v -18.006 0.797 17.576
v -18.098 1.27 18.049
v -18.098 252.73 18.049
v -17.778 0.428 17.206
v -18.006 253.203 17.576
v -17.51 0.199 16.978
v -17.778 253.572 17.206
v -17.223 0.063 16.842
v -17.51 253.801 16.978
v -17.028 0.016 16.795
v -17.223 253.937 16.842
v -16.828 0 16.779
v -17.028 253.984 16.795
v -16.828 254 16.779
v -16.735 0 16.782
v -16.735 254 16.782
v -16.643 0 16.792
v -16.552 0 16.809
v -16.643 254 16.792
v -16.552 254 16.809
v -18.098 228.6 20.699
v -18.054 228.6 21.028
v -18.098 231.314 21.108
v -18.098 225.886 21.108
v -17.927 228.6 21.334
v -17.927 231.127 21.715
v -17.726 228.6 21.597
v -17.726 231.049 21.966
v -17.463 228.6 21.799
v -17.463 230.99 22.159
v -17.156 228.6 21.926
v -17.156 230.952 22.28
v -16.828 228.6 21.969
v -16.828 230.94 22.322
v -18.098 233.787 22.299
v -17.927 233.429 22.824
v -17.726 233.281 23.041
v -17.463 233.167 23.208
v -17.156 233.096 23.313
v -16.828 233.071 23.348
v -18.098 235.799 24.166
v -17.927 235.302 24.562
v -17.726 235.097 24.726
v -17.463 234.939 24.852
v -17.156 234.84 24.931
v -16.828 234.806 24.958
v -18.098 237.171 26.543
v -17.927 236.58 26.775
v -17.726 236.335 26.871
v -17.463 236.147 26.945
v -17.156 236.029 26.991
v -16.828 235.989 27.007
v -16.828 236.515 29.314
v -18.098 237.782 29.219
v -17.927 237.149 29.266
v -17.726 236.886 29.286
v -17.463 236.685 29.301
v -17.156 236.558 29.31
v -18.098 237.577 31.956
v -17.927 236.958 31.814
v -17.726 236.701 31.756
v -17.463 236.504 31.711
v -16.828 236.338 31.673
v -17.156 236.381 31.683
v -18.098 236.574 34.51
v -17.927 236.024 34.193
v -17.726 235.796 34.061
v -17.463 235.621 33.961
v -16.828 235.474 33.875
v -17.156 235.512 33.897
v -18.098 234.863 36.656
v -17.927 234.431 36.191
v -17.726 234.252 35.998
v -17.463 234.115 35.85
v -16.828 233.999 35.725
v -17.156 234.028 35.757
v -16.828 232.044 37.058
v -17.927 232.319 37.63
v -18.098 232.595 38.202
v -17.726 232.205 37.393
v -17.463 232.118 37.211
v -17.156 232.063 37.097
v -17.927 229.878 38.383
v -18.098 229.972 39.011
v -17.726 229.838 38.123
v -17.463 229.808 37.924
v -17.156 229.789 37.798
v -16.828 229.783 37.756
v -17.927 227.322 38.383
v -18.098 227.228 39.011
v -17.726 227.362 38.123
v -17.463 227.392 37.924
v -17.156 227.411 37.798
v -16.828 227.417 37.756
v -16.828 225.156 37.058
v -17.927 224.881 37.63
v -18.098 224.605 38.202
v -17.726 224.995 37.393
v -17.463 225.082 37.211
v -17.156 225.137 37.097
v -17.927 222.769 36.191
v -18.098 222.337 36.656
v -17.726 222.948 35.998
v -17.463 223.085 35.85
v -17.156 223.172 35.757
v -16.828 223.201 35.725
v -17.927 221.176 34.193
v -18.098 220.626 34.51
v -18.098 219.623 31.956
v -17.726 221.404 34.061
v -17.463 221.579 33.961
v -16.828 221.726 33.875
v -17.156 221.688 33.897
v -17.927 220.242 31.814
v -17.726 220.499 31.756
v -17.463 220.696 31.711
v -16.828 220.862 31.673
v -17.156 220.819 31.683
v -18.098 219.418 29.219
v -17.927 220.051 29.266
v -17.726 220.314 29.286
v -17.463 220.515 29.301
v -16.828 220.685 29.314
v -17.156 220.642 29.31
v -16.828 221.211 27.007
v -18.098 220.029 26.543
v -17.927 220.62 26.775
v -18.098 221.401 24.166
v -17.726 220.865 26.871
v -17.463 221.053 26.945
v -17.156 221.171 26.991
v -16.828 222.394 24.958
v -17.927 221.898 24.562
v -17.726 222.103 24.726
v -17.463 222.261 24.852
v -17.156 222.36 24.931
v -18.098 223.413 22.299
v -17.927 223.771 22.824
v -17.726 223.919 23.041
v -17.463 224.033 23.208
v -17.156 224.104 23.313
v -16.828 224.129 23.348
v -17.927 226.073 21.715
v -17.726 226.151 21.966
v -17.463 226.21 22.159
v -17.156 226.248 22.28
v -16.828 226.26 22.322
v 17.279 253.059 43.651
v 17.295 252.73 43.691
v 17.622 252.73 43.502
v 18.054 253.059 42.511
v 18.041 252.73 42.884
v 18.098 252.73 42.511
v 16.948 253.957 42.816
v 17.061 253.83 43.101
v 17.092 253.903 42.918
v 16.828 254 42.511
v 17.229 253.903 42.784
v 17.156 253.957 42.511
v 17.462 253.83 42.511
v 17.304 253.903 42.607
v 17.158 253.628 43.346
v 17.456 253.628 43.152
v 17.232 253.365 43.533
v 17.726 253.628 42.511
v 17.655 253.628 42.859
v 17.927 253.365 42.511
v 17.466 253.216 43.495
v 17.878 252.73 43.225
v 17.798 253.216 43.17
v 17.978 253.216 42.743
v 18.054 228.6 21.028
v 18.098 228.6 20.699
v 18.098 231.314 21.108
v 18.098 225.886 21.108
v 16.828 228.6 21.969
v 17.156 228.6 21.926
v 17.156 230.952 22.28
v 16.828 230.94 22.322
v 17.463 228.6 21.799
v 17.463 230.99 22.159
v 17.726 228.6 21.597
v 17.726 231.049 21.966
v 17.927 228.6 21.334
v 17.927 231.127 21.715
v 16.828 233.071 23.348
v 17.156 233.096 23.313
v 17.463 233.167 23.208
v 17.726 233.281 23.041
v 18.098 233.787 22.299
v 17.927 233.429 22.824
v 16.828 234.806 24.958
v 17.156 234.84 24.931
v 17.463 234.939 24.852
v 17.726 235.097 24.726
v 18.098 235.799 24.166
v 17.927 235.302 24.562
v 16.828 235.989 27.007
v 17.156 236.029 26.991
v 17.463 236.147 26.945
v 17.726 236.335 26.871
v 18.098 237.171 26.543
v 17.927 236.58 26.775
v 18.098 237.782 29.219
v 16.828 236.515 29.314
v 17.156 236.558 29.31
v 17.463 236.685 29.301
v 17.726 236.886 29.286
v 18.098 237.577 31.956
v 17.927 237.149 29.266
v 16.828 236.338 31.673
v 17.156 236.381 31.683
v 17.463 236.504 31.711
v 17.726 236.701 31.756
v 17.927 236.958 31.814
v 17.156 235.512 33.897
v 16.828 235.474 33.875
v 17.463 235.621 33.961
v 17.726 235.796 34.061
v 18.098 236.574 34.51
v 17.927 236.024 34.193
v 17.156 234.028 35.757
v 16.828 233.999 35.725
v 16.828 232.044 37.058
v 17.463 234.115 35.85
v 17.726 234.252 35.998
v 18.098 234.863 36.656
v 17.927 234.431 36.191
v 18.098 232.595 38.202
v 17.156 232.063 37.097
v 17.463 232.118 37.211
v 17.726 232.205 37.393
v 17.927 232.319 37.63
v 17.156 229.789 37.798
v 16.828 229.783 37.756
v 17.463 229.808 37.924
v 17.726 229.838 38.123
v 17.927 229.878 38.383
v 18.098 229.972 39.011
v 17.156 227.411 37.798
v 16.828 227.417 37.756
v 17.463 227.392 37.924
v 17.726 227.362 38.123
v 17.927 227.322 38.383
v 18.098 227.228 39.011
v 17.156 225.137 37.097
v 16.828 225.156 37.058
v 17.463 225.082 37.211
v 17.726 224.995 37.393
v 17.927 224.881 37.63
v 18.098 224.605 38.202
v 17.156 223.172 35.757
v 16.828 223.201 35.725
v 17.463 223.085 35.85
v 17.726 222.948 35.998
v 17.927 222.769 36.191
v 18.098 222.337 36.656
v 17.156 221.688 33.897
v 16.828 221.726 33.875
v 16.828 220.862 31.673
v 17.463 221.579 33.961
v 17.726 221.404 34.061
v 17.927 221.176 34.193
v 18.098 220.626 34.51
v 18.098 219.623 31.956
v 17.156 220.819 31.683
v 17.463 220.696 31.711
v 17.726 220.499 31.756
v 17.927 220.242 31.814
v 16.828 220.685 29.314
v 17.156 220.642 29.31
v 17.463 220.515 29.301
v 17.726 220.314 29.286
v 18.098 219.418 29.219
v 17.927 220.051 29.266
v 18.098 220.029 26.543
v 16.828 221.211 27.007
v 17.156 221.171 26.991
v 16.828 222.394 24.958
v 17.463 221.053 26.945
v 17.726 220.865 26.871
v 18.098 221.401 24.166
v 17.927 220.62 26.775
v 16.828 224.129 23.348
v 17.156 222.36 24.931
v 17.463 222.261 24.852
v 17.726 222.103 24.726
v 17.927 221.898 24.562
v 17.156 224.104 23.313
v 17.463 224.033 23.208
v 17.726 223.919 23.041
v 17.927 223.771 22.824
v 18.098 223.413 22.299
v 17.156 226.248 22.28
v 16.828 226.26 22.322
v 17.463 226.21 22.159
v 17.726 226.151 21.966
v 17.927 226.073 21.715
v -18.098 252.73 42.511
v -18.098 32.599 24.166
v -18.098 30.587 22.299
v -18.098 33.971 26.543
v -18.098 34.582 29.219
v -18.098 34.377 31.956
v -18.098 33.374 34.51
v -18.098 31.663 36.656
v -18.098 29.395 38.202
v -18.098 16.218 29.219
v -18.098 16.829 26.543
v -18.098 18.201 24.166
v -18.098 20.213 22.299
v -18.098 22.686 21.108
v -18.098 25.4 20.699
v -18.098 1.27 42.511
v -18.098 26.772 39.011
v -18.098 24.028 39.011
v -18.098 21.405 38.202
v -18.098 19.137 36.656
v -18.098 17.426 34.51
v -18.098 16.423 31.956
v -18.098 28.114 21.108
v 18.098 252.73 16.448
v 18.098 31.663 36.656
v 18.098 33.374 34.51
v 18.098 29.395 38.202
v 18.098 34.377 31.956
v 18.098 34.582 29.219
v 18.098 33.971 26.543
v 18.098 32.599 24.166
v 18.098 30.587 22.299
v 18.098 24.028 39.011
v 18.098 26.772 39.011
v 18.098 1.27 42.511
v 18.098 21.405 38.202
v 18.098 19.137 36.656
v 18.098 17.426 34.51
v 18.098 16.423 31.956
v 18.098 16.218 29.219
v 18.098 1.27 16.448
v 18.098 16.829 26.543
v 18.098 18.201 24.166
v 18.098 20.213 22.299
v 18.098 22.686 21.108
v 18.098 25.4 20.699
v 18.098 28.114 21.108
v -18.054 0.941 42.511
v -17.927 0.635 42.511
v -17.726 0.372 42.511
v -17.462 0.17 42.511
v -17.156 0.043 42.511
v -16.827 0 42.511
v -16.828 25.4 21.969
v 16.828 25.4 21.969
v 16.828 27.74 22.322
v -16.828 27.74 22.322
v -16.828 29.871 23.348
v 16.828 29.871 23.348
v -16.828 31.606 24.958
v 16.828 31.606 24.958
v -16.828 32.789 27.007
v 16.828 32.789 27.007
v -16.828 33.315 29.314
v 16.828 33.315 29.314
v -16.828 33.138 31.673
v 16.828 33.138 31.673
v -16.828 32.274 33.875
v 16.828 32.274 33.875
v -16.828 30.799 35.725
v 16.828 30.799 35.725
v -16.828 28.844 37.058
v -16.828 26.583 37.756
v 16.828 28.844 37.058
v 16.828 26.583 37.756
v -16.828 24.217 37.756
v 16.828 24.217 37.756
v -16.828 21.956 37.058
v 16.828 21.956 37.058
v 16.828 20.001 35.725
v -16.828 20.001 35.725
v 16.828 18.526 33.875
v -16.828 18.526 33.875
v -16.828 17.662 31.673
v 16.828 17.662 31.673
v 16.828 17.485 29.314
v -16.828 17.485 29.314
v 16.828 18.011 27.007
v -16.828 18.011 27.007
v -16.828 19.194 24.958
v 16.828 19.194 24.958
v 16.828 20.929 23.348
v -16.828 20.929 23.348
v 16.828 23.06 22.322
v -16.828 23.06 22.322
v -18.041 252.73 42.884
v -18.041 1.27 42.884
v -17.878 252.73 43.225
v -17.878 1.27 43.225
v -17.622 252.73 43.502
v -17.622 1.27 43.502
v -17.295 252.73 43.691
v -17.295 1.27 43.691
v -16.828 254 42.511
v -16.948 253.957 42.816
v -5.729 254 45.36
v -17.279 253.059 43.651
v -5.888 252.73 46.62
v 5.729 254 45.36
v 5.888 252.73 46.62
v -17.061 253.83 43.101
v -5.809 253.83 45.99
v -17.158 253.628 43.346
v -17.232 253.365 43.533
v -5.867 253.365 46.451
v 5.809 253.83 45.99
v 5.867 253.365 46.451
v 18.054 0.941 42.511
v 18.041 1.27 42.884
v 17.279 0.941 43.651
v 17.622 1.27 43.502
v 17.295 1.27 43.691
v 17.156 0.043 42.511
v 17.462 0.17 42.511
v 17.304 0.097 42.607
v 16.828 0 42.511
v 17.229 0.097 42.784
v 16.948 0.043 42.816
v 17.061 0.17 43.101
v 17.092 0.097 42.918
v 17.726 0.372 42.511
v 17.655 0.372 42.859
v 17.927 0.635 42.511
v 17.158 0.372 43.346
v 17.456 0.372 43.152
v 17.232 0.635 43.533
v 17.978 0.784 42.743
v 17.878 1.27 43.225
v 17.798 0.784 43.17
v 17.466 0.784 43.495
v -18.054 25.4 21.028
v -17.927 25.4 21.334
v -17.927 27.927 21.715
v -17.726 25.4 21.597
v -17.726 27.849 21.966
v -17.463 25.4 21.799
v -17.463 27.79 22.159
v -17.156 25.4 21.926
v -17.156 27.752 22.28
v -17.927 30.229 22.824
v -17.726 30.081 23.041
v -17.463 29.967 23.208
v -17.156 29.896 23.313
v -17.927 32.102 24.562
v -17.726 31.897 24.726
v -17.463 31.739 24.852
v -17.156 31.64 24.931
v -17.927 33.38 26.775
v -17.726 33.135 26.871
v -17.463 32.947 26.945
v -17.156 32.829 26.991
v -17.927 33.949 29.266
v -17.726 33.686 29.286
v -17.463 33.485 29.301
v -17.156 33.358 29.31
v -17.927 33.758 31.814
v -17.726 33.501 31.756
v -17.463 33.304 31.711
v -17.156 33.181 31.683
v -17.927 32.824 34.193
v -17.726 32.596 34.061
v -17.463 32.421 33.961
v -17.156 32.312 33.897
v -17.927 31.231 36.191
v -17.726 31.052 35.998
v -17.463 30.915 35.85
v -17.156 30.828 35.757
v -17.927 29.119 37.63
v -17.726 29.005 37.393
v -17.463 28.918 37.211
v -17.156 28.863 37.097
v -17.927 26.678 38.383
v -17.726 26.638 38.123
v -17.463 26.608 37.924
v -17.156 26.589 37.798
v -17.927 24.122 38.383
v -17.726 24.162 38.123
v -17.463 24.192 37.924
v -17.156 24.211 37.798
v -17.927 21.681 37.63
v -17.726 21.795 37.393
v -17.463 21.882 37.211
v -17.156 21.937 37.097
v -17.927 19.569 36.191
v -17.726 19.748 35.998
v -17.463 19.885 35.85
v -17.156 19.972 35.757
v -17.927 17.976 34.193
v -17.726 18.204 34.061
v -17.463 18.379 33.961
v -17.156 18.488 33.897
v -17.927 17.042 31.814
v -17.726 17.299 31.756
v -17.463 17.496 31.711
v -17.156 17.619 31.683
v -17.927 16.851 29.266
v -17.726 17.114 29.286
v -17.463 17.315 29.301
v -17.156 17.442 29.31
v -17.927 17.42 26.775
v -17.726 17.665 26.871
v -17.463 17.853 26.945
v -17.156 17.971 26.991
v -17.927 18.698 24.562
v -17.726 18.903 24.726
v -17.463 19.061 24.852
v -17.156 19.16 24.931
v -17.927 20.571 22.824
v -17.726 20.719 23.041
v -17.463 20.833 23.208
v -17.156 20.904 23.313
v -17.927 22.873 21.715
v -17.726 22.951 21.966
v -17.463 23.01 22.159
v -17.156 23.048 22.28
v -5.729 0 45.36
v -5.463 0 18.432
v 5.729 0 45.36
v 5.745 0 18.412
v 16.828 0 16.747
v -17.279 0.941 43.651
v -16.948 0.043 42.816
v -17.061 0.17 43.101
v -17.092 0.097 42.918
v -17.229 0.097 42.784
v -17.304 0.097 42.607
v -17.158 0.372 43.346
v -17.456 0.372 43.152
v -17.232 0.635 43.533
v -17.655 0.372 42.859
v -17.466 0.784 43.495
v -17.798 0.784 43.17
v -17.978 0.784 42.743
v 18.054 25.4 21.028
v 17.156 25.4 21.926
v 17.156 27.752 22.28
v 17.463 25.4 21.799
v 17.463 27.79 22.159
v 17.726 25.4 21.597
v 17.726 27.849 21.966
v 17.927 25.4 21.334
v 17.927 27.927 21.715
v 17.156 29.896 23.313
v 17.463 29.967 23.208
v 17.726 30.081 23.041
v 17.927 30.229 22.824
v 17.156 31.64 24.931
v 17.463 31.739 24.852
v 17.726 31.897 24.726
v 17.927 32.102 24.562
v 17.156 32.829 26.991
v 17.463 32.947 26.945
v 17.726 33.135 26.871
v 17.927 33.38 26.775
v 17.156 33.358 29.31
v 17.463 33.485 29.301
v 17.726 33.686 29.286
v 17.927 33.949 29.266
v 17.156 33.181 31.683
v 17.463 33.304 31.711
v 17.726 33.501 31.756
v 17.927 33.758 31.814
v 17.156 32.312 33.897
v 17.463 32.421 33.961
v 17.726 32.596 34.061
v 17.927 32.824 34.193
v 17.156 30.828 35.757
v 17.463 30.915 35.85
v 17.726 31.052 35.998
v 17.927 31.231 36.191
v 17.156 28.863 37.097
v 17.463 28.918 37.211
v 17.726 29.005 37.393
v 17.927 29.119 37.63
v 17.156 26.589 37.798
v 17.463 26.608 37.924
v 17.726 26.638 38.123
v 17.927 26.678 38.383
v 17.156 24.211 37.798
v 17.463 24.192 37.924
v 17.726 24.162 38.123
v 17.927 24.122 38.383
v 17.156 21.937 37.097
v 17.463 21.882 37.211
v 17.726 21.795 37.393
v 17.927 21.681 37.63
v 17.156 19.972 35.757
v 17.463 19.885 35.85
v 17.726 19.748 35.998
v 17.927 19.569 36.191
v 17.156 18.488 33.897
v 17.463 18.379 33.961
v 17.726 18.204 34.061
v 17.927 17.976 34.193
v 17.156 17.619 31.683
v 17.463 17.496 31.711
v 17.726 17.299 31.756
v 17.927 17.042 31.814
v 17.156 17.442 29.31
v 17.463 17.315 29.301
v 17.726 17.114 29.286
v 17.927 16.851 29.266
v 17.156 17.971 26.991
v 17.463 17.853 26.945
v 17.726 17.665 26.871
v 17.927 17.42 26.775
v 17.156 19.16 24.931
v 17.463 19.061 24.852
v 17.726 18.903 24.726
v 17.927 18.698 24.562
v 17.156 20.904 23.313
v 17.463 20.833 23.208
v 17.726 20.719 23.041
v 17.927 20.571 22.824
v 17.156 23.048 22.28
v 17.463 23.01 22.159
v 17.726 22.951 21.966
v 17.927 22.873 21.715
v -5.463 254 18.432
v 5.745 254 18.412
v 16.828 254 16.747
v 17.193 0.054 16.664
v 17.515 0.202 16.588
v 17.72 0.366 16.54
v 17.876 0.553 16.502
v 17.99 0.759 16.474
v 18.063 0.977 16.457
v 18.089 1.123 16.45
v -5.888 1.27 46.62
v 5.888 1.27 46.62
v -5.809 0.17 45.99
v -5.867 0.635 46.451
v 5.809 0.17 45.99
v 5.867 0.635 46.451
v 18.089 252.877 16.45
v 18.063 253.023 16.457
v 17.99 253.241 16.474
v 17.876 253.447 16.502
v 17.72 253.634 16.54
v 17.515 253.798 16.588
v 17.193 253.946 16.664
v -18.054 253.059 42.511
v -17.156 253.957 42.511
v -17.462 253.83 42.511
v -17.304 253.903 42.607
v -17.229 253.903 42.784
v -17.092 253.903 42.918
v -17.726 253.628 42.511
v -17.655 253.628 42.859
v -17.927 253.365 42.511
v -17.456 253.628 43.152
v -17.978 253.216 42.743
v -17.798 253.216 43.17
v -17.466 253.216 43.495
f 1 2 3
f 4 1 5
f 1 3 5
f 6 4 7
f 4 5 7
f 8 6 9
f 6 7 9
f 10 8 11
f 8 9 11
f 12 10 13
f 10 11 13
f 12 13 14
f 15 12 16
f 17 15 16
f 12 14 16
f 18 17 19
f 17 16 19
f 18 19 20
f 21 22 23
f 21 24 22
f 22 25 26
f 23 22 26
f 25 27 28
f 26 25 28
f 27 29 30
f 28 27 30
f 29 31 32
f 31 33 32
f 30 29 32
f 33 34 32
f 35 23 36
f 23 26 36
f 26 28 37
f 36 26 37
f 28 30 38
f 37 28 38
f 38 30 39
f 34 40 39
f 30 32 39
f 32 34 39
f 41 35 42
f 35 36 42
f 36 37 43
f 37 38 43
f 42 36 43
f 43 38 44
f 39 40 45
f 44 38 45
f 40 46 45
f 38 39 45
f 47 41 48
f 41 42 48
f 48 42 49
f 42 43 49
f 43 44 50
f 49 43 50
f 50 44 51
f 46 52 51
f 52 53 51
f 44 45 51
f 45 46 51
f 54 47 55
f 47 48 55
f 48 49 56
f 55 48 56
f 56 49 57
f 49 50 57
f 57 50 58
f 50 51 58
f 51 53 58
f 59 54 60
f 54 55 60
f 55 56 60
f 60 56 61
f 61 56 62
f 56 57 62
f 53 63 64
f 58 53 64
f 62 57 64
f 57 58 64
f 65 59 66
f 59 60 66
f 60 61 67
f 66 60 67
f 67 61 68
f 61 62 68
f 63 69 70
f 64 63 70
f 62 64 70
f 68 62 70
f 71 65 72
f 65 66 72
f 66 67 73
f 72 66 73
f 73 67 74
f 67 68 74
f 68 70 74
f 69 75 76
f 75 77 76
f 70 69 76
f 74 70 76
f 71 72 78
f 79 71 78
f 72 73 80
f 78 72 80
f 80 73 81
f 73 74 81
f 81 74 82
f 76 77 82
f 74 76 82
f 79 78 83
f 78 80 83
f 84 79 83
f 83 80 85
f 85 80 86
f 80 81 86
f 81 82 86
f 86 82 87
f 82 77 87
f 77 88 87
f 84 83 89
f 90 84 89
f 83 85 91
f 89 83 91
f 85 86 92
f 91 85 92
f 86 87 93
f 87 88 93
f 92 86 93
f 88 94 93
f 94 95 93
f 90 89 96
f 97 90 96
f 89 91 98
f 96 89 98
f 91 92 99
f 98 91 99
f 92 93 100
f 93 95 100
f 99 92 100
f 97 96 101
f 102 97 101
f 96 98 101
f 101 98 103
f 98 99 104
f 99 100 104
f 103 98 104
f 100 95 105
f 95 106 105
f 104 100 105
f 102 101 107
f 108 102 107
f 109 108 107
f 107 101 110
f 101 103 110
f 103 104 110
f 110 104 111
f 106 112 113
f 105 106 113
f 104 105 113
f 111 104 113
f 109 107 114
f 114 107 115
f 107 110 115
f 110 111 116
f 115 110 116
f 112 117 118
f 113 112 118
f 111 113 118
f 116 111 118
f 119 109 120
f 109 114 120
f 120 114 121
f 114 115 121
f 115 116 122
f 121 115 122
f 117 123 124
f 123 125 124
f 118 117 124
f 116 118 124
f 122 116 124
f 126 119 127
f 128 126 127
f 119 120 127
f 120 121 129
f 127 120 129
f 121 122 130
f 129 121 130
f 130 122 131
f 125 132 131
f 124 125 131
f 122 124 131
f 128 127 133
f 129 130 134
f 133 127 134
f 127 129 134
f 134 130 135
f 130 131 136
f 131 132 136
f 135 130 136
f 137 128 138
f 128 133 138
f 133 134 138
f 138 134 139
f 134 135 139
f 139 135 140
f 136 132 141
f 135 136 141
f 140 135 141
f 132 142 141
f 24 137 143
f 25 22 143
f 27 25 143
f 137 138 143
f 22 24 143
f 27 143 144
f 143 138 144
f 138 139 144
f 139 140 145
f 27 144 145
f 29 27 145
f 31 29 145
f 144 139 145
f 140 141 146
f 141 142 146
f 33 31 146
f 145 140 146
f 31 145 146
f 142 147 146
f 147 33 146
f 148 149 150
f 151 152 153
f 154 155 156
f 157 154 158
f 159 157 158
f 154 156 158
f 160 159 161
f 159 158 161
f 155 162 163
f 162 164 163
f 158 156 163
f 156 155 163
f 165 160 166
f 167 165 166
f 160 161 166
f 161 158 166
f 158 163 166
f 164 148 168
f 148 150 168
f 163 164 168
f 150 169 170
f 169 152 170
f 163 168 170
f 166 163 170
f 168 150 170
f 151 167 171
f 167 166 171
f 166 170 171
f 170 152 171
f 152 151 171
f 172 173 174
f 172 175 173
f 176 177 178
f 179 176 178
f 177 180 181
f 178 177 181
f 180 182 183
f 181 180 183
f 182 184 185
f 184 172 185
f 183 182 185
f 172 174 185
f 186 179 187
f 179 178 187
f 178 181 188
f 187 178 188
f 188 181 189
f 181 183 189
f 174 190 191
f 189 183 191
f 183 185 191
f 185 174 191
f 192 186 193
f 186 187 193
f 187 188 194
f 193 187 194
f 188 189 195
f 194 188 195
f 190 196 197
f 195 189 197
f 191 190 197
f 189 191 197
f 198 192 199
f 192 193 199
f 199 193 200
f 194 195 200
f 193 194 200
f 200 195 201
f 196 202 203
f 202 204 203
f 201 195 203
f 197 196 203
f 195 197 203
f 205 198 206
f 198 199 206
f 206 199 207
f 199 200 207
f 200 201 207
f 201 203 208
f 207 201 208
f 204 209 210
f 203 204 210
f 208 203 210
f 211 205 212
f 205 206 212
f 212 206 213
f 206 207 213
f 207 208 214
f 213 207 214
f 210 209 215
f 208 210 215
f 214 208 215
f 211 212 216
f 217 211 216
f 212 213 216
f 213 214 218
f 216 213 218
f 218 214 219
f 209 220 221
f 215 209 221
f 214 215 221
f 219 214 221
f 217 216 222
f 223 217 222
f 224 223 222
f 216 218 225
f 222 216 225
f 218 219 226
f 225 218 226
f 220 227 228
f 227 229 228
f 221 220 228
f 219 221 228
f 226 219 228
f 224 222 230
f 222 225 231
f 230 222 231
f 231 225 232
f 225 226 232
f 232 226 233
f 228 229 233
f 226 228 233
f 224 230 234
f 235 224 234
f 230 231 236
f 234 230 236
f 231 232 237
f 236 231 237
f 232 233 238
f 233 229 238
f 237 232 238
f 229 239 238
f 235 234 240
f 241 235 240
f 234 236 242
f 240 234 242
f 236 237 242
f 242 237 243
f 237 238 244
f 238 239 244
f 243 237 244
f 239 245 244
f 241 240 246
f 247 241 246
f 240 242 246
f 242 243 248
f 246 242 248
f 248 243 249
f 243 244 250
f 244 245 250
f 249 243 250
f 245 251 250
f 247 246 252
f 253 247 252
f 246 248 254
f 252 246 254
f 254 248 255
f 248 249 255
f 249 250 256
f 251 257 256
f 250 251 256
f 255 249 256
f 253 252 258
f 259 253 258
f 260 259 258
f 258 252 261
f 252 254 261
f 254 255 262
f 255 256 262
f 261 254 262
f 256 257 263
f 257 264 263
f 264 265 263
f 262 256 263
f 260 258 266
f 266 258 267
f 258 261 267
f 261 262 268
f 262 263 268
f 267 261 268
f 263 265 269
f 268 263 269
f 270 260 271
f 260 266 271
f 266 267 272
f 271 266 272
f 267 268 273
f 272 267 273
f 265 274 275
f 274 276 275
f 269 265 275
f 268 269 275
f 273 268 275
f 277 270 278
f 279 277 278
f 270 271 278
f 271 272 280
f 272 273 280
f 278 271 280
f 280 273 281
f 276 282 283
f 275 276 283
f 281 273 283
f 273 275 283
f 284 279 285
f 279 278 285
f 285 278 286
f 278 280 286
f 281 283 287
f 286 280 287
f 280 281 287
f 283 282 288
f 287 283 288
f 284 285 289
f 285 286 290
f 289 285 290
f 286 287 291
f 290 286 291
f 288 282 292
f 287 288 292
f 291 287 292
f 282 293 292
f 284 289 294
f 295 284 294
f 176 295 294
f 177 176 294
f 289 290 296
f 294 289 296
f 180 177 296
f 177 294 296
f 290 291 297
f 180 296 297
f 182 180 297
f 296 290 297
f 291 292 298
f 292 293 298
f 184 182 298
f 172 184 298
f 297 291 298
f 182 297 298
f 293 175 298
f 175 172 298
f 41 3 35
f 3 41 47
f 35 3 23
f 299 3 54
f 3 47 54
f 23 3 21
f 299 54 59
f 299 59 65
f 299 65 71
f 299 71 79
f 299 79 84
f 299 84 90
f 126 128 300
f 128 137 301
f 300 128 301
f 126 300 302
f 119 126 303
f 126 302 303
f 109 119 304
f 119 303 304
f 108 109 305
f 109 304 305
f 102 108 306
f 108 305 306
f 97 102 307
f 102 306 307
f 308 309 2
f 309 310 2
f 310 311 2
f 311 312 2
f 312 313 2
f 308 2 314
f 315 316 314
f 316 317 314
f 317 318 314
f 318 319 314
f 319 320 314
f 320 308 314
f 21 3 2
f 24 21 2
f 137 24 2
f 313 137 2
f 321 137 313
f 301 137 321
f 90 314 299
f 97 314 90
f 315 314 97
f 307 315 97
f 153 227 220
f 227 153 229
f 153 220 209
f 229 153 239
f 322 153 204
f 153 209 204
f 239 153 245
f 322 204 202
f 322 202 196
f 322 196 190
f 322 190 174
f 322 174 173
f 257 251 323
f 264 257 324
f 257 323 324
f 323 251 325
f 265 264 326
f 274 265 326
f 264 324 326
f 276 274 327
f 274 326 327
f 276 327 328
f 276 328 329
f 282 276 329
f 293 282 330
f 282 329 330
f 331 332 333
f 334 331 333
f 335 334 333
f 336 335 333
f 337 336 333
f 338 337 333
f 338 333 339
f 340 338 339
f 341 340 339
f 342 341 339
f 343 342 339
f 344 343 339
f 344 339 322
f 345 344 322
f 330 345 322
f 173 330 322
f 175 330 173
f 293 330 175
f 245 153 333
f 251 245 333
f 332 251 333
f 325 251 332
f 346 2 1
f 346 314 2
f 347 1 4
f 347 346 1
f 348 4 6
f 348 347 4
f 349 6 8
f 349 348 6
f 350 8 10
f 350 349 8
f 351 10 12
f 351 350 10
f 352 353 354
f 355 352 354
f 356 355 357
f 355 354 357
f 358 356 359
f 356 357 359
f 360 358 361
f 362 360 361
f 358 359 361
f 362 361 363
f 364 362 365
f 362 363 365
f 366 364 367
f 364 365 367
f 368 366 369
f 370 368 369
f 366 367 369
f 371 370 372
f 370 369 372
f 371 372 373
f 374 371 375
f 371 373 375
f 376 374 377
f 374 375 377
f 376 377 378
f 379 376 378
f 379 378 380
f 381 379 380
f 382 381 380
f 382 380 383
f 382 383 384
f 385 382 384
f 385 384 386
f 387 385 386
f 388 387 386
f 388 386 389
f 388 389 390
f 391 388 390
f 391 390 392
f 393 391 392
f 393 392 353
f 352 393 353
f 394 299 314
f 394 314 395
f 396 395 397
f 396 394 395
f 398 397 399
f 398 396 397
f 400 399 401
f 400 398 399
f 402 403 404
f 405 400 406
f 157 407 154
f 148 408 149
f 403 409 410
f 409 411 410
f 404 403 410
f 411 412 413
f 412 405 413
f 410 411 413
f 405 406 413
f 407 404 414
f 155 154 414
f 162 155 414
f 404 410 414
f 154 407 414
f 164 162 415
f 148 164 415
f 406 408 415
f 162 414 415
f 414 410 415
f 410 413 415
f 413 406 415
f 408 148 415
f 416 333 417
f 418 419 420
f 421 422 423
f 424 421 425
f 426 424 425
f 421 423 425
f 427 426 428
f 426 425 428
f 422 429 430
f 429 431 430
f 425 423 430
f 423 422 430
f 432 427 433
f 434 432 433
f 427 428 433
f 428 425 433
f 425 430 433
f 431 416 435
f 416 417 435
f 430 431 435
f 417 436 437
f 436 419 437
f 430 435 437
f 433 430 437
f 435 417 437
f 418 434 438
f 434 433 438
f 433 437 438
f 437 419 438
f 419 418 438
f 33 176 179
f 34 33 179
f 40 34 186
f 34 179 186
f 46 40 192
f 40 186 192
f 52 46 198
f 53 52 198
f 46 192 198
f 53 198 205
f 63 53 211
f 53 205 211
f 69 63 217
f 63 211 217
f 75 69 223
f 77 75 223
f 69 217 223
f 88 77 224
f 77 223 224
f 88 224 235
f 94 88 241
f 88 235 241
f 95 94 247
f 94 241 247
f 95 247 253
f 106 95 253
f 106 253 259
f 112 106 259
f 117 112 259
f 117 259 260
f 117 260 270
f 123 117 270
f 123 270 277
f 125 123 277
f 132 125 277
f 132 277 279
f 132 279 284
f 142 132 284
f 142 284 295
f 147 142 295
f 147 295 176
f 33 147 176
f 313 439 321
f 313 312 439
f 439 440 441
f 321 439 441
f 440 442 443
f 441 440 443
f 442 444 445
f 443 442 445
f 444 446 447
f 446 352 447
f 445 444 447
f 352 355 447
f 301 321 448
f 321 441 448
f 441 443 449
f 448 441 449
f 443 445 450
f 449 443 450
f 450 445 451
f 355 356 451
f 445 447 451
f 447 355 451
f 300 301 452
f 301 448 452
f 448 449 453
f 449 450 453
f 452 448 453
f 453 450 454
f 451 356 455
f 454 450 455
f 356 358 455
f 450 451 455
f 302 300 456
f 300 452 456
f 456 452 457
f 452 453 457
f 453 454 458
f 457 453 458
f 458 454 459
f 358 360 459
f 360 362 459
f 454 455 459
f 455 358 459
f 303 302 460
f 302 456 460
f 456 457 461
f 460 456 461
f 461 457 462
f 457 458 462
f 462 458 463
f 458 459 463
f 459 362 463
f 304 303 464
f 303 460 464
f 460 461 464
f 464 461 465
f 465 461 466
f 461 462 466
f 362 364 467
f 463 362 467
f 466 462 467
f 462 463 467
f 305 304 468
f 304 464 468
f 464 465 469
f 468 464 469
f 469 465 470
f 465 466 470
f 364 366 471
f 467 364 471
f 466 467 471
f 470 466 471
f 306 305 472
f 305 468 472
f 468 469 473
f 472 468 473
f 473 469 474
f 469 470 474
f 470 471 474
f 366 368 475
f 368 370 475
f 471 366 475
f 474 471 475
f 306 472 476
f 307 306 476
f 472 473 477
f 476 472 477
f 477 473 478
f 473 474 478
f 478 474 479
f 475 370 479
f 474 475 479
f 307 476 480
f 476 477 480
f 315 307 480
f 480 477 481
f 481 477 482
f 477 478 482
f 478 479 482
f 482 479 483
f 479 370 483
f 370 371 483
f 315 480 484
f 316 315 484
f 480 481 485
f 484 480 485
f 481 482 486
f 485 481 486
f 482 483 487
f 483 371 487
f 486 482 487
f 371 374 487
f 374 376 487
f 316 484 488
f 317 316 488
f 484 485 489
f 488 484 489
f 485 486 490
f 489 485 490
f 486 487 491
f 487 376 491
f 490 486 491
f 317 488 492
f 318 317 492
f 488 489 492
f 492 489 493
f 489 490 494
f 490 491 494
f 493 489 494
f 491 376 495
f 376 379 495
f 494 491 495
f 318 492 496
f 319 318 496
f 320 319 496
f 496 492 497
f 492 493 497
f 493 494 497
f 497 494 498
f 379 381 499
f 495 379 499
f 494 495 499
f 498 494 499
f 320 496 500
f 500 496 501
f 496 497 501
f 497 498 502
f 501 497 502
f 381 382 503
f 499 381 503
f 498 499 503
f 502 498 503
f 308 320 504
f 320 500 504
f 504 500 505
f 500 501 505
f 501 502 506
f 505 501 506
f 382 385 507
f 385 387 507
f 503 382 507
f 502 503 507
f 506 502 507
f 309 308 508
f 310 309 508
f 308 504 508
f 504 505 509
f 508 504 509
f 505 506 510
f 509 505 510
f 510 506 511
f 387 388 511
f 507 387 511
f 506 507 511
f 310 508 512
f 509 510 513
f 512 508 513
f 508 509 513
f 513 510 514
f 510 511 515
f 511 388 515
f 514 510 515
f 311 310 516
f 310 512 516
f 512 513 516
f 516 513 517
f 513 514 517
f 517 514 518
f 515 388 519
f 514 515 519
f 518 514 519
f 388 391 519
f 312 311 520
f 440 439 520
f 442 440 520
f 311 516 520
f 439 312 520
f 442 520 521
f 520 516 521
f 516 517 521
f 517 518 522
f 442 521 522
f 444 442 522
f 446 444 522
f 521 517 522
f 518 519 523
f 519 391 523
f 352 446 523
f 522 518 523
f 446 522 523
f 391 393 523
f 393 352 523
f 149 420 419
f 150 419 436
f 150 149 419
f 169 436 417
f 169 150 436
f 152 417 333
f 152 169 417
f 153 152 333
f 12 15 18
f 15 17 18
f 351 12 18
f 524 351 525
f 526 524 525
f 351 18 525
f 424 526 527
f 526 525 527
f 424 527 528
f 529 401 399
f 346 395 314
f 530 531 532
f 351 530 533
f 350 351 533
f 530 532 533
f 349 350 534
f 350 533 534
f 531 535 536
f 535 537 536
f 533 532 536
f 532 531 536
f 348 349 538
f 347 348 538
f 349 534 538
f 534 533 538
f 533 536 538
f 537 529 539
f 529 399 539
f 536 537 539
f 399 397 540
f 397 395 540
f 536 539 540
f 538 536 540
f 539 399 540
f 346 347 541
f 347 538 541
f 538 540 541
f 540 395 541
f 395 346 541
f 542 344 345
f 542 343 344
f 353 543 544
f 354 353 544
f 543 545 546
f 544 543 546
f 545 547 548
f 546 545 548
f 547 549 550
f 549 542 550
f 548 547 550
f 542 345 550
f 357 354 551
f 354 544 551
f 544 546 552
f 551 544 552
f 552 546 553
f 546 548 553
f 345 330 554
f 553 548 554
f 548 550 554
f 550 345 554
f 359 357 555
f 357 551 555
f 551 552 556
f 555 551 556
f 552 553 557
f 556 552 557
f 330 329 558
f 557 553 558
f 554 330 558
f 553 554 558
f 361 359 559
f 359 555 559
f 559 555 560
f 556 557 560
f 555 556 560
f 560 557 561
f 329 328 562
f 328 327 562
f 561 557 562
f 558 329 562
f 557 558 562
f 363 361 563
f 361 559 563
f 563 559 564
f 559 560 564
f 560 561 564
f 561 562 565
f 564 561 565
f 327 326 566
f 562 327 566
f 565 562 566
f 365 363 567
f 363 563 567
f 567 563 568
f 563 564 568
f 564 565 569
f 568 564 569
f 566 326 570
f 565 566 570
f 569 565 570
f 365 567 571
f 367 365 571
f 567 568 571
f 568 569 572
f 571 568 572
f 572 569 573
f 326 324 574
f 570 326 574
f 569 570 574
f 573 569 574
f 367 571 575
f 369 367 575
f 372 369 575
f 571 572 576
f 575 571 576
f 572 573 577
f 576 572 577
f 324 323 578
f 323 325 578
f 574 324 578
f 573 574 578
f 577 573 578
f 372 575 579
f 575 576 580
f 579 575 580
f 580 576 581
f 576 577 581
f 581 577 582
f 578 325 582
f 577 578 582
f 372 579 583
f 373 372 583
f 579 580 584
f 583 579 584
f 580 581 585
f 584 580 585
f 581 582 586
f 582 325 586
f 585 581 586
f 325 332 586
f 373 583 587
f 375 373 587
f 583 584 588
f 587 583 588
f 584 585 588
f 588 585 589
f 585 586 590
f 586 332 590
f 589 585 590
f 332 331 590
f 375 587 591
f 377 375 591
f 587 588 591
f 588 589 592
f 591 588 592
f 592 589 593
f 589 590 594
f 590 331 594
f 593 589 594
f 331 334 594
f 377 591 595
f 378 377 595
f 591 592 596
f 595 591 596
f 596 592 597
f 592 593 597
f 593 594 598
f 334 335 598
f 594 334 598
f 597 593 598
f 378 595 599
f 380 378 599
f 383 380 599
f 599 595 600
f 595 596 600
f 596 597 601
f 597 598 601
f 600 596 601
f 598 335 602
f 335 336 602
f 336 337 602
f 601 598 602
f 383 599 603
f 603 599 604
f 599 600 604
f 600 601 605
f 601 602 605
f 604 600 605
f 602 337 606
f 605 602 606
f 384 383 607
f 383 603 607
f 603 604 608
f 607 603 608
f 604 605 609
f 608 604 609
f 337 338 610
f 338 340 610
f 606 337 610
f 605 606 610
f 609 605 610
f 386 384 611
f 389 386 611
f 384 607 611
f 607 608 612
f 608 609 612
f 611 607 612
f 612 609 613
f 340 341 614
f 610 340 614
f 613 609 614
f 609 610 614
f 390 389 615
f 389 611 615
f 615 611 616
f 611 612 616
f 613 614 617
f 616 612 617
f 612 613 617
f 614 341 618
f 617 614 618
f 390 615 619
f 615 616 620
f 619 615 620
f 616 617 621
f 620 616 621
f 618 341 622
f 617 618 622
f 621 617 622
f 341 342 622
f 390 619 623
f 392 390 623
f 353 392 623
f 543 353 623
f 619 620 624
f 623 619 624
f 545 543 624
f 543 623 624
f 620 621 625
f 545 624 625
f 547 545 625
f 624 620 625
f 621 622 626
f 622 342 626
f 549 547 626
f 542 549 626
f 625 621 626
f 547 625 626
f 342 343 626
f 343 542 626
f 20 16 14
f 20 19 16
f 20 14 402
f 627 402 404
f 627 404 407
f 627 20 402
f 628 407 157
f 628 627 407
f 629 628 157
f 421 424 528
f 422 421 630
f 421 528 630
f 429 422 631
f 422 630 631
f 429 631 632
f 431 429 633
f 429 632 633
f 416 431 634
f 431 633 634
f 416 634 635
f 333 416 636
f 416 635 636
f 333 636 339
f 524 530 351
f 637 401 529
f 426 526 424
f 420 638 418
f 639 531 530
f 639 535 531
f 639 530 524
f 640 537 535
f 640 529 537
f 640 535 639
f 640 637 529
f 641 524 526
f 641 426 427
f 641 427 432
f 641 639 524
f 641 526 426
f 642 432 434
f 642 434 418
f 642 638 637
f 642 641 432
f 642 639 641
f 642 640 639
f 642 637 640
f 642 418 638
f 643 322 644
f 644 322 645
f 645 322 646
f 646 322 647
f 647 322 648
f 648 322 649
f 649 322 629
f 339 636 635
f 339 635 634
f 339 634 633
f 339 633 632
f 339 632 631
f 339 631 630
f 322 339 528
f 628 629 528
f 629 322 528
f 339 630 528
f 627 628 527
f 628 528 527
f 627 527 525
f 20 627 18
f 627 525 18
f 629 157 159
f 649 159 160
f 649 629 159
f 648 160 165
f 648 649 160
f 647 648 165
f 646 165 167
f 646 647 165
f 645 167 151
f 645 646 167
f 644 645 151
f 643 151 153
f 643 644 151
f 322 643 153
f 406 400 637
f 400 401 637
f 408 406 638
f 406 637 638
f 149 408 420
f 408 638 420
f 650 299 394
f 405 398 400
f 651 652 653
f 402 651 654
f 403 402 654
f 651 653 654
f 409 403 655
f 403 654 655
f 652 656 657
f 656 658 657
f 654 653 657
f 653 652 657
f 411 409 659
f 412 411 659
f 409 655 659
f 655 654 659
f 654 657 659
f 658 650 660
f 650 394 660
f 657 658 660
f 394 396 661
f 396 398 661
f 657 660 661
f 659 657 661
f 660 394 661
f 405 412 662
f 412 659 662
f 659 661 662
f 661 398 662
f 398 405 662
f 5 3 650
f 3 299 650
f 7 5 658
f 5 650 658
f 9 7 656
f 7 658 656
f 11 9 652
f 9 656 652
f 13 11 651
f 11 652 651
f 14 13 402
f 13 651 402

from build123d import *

# Parameters (mm, degrees)
BOSS_EXTRUDE1_DEPTH = 254
SKETCH2_R           = 7.9375
CUT_EXTRUDE1_DEPTH  = 261.833544861
FILLET1_R           = 1.27


with BuildPart() as part:
    # Sketch1 → Boss-Extrude1 (new body)
    with BuildSketch(Plane(origin=(0, 0, 0), x_dir=(1, 0, 0), z_dir=(0, 1, 0))):
        with BuildLine():
            Line((-18.0975, -16.448172274), (-18.0975, -43.365200262))
            ThreePointArc((-18.0975, -43.365200262), (0, -46.99), (18.0975, -43.365200262))
            Line((18.0975, -43.365200262), (18.0975, -16.448172274))
            ThreePointArc((18.0975, -16.448172274), (0, -18.628441839), (-18.0975, -16.448172274))
        make_face()
    extrude(amount=BOSS_EXTRUDE1_DEPTH)

    # Sketch2 → Cut-Extrude1 (cut, through all)
    with BuildSketch(Plane(origin=(18.0975, 0, 0), x_dir=(0, 0, -1), z_dir=(1, 0, 0))):
        with Locations((-29.906686268, 228.6)):
            Circle(SKETCH2_R)
        with Locations((-29.906686268, 25.4)):
            Circle(SKETCH2_R)
    extrude(amount=-CUT_EXTRUDE1_DEPTH, mode=Mode.SUBTRACT)

    # Fillet1
    fillet1_edges = [part.edges().sort_by_distance(p)[0] for p in [
        (0, 254, 46.99),
        (18.0975, 254, 29.906686268),
        (-18.0975, 228.6, 37.844186268),
        (18.0975, 228.6, 37.844186268),
        (-18.0975, 25.4, 37.844186268),
        (18.0975, 25.4, 37.844186268),
        (18.0975, 0, 29.906686268),
        (0, 0, 46.99),
        (-18.0975, 0, 29.906686268),
        (18.0975, 127, 43.365200262),
        (-18.0975, 127, 43.365200262),
        (-18.0975, 127, 16.448172274),
        (-18.0975, 254, 29.906686268),
    ]]
    fillet(fillet1_edges, radius=FILLET1_R)


solid = part.part
